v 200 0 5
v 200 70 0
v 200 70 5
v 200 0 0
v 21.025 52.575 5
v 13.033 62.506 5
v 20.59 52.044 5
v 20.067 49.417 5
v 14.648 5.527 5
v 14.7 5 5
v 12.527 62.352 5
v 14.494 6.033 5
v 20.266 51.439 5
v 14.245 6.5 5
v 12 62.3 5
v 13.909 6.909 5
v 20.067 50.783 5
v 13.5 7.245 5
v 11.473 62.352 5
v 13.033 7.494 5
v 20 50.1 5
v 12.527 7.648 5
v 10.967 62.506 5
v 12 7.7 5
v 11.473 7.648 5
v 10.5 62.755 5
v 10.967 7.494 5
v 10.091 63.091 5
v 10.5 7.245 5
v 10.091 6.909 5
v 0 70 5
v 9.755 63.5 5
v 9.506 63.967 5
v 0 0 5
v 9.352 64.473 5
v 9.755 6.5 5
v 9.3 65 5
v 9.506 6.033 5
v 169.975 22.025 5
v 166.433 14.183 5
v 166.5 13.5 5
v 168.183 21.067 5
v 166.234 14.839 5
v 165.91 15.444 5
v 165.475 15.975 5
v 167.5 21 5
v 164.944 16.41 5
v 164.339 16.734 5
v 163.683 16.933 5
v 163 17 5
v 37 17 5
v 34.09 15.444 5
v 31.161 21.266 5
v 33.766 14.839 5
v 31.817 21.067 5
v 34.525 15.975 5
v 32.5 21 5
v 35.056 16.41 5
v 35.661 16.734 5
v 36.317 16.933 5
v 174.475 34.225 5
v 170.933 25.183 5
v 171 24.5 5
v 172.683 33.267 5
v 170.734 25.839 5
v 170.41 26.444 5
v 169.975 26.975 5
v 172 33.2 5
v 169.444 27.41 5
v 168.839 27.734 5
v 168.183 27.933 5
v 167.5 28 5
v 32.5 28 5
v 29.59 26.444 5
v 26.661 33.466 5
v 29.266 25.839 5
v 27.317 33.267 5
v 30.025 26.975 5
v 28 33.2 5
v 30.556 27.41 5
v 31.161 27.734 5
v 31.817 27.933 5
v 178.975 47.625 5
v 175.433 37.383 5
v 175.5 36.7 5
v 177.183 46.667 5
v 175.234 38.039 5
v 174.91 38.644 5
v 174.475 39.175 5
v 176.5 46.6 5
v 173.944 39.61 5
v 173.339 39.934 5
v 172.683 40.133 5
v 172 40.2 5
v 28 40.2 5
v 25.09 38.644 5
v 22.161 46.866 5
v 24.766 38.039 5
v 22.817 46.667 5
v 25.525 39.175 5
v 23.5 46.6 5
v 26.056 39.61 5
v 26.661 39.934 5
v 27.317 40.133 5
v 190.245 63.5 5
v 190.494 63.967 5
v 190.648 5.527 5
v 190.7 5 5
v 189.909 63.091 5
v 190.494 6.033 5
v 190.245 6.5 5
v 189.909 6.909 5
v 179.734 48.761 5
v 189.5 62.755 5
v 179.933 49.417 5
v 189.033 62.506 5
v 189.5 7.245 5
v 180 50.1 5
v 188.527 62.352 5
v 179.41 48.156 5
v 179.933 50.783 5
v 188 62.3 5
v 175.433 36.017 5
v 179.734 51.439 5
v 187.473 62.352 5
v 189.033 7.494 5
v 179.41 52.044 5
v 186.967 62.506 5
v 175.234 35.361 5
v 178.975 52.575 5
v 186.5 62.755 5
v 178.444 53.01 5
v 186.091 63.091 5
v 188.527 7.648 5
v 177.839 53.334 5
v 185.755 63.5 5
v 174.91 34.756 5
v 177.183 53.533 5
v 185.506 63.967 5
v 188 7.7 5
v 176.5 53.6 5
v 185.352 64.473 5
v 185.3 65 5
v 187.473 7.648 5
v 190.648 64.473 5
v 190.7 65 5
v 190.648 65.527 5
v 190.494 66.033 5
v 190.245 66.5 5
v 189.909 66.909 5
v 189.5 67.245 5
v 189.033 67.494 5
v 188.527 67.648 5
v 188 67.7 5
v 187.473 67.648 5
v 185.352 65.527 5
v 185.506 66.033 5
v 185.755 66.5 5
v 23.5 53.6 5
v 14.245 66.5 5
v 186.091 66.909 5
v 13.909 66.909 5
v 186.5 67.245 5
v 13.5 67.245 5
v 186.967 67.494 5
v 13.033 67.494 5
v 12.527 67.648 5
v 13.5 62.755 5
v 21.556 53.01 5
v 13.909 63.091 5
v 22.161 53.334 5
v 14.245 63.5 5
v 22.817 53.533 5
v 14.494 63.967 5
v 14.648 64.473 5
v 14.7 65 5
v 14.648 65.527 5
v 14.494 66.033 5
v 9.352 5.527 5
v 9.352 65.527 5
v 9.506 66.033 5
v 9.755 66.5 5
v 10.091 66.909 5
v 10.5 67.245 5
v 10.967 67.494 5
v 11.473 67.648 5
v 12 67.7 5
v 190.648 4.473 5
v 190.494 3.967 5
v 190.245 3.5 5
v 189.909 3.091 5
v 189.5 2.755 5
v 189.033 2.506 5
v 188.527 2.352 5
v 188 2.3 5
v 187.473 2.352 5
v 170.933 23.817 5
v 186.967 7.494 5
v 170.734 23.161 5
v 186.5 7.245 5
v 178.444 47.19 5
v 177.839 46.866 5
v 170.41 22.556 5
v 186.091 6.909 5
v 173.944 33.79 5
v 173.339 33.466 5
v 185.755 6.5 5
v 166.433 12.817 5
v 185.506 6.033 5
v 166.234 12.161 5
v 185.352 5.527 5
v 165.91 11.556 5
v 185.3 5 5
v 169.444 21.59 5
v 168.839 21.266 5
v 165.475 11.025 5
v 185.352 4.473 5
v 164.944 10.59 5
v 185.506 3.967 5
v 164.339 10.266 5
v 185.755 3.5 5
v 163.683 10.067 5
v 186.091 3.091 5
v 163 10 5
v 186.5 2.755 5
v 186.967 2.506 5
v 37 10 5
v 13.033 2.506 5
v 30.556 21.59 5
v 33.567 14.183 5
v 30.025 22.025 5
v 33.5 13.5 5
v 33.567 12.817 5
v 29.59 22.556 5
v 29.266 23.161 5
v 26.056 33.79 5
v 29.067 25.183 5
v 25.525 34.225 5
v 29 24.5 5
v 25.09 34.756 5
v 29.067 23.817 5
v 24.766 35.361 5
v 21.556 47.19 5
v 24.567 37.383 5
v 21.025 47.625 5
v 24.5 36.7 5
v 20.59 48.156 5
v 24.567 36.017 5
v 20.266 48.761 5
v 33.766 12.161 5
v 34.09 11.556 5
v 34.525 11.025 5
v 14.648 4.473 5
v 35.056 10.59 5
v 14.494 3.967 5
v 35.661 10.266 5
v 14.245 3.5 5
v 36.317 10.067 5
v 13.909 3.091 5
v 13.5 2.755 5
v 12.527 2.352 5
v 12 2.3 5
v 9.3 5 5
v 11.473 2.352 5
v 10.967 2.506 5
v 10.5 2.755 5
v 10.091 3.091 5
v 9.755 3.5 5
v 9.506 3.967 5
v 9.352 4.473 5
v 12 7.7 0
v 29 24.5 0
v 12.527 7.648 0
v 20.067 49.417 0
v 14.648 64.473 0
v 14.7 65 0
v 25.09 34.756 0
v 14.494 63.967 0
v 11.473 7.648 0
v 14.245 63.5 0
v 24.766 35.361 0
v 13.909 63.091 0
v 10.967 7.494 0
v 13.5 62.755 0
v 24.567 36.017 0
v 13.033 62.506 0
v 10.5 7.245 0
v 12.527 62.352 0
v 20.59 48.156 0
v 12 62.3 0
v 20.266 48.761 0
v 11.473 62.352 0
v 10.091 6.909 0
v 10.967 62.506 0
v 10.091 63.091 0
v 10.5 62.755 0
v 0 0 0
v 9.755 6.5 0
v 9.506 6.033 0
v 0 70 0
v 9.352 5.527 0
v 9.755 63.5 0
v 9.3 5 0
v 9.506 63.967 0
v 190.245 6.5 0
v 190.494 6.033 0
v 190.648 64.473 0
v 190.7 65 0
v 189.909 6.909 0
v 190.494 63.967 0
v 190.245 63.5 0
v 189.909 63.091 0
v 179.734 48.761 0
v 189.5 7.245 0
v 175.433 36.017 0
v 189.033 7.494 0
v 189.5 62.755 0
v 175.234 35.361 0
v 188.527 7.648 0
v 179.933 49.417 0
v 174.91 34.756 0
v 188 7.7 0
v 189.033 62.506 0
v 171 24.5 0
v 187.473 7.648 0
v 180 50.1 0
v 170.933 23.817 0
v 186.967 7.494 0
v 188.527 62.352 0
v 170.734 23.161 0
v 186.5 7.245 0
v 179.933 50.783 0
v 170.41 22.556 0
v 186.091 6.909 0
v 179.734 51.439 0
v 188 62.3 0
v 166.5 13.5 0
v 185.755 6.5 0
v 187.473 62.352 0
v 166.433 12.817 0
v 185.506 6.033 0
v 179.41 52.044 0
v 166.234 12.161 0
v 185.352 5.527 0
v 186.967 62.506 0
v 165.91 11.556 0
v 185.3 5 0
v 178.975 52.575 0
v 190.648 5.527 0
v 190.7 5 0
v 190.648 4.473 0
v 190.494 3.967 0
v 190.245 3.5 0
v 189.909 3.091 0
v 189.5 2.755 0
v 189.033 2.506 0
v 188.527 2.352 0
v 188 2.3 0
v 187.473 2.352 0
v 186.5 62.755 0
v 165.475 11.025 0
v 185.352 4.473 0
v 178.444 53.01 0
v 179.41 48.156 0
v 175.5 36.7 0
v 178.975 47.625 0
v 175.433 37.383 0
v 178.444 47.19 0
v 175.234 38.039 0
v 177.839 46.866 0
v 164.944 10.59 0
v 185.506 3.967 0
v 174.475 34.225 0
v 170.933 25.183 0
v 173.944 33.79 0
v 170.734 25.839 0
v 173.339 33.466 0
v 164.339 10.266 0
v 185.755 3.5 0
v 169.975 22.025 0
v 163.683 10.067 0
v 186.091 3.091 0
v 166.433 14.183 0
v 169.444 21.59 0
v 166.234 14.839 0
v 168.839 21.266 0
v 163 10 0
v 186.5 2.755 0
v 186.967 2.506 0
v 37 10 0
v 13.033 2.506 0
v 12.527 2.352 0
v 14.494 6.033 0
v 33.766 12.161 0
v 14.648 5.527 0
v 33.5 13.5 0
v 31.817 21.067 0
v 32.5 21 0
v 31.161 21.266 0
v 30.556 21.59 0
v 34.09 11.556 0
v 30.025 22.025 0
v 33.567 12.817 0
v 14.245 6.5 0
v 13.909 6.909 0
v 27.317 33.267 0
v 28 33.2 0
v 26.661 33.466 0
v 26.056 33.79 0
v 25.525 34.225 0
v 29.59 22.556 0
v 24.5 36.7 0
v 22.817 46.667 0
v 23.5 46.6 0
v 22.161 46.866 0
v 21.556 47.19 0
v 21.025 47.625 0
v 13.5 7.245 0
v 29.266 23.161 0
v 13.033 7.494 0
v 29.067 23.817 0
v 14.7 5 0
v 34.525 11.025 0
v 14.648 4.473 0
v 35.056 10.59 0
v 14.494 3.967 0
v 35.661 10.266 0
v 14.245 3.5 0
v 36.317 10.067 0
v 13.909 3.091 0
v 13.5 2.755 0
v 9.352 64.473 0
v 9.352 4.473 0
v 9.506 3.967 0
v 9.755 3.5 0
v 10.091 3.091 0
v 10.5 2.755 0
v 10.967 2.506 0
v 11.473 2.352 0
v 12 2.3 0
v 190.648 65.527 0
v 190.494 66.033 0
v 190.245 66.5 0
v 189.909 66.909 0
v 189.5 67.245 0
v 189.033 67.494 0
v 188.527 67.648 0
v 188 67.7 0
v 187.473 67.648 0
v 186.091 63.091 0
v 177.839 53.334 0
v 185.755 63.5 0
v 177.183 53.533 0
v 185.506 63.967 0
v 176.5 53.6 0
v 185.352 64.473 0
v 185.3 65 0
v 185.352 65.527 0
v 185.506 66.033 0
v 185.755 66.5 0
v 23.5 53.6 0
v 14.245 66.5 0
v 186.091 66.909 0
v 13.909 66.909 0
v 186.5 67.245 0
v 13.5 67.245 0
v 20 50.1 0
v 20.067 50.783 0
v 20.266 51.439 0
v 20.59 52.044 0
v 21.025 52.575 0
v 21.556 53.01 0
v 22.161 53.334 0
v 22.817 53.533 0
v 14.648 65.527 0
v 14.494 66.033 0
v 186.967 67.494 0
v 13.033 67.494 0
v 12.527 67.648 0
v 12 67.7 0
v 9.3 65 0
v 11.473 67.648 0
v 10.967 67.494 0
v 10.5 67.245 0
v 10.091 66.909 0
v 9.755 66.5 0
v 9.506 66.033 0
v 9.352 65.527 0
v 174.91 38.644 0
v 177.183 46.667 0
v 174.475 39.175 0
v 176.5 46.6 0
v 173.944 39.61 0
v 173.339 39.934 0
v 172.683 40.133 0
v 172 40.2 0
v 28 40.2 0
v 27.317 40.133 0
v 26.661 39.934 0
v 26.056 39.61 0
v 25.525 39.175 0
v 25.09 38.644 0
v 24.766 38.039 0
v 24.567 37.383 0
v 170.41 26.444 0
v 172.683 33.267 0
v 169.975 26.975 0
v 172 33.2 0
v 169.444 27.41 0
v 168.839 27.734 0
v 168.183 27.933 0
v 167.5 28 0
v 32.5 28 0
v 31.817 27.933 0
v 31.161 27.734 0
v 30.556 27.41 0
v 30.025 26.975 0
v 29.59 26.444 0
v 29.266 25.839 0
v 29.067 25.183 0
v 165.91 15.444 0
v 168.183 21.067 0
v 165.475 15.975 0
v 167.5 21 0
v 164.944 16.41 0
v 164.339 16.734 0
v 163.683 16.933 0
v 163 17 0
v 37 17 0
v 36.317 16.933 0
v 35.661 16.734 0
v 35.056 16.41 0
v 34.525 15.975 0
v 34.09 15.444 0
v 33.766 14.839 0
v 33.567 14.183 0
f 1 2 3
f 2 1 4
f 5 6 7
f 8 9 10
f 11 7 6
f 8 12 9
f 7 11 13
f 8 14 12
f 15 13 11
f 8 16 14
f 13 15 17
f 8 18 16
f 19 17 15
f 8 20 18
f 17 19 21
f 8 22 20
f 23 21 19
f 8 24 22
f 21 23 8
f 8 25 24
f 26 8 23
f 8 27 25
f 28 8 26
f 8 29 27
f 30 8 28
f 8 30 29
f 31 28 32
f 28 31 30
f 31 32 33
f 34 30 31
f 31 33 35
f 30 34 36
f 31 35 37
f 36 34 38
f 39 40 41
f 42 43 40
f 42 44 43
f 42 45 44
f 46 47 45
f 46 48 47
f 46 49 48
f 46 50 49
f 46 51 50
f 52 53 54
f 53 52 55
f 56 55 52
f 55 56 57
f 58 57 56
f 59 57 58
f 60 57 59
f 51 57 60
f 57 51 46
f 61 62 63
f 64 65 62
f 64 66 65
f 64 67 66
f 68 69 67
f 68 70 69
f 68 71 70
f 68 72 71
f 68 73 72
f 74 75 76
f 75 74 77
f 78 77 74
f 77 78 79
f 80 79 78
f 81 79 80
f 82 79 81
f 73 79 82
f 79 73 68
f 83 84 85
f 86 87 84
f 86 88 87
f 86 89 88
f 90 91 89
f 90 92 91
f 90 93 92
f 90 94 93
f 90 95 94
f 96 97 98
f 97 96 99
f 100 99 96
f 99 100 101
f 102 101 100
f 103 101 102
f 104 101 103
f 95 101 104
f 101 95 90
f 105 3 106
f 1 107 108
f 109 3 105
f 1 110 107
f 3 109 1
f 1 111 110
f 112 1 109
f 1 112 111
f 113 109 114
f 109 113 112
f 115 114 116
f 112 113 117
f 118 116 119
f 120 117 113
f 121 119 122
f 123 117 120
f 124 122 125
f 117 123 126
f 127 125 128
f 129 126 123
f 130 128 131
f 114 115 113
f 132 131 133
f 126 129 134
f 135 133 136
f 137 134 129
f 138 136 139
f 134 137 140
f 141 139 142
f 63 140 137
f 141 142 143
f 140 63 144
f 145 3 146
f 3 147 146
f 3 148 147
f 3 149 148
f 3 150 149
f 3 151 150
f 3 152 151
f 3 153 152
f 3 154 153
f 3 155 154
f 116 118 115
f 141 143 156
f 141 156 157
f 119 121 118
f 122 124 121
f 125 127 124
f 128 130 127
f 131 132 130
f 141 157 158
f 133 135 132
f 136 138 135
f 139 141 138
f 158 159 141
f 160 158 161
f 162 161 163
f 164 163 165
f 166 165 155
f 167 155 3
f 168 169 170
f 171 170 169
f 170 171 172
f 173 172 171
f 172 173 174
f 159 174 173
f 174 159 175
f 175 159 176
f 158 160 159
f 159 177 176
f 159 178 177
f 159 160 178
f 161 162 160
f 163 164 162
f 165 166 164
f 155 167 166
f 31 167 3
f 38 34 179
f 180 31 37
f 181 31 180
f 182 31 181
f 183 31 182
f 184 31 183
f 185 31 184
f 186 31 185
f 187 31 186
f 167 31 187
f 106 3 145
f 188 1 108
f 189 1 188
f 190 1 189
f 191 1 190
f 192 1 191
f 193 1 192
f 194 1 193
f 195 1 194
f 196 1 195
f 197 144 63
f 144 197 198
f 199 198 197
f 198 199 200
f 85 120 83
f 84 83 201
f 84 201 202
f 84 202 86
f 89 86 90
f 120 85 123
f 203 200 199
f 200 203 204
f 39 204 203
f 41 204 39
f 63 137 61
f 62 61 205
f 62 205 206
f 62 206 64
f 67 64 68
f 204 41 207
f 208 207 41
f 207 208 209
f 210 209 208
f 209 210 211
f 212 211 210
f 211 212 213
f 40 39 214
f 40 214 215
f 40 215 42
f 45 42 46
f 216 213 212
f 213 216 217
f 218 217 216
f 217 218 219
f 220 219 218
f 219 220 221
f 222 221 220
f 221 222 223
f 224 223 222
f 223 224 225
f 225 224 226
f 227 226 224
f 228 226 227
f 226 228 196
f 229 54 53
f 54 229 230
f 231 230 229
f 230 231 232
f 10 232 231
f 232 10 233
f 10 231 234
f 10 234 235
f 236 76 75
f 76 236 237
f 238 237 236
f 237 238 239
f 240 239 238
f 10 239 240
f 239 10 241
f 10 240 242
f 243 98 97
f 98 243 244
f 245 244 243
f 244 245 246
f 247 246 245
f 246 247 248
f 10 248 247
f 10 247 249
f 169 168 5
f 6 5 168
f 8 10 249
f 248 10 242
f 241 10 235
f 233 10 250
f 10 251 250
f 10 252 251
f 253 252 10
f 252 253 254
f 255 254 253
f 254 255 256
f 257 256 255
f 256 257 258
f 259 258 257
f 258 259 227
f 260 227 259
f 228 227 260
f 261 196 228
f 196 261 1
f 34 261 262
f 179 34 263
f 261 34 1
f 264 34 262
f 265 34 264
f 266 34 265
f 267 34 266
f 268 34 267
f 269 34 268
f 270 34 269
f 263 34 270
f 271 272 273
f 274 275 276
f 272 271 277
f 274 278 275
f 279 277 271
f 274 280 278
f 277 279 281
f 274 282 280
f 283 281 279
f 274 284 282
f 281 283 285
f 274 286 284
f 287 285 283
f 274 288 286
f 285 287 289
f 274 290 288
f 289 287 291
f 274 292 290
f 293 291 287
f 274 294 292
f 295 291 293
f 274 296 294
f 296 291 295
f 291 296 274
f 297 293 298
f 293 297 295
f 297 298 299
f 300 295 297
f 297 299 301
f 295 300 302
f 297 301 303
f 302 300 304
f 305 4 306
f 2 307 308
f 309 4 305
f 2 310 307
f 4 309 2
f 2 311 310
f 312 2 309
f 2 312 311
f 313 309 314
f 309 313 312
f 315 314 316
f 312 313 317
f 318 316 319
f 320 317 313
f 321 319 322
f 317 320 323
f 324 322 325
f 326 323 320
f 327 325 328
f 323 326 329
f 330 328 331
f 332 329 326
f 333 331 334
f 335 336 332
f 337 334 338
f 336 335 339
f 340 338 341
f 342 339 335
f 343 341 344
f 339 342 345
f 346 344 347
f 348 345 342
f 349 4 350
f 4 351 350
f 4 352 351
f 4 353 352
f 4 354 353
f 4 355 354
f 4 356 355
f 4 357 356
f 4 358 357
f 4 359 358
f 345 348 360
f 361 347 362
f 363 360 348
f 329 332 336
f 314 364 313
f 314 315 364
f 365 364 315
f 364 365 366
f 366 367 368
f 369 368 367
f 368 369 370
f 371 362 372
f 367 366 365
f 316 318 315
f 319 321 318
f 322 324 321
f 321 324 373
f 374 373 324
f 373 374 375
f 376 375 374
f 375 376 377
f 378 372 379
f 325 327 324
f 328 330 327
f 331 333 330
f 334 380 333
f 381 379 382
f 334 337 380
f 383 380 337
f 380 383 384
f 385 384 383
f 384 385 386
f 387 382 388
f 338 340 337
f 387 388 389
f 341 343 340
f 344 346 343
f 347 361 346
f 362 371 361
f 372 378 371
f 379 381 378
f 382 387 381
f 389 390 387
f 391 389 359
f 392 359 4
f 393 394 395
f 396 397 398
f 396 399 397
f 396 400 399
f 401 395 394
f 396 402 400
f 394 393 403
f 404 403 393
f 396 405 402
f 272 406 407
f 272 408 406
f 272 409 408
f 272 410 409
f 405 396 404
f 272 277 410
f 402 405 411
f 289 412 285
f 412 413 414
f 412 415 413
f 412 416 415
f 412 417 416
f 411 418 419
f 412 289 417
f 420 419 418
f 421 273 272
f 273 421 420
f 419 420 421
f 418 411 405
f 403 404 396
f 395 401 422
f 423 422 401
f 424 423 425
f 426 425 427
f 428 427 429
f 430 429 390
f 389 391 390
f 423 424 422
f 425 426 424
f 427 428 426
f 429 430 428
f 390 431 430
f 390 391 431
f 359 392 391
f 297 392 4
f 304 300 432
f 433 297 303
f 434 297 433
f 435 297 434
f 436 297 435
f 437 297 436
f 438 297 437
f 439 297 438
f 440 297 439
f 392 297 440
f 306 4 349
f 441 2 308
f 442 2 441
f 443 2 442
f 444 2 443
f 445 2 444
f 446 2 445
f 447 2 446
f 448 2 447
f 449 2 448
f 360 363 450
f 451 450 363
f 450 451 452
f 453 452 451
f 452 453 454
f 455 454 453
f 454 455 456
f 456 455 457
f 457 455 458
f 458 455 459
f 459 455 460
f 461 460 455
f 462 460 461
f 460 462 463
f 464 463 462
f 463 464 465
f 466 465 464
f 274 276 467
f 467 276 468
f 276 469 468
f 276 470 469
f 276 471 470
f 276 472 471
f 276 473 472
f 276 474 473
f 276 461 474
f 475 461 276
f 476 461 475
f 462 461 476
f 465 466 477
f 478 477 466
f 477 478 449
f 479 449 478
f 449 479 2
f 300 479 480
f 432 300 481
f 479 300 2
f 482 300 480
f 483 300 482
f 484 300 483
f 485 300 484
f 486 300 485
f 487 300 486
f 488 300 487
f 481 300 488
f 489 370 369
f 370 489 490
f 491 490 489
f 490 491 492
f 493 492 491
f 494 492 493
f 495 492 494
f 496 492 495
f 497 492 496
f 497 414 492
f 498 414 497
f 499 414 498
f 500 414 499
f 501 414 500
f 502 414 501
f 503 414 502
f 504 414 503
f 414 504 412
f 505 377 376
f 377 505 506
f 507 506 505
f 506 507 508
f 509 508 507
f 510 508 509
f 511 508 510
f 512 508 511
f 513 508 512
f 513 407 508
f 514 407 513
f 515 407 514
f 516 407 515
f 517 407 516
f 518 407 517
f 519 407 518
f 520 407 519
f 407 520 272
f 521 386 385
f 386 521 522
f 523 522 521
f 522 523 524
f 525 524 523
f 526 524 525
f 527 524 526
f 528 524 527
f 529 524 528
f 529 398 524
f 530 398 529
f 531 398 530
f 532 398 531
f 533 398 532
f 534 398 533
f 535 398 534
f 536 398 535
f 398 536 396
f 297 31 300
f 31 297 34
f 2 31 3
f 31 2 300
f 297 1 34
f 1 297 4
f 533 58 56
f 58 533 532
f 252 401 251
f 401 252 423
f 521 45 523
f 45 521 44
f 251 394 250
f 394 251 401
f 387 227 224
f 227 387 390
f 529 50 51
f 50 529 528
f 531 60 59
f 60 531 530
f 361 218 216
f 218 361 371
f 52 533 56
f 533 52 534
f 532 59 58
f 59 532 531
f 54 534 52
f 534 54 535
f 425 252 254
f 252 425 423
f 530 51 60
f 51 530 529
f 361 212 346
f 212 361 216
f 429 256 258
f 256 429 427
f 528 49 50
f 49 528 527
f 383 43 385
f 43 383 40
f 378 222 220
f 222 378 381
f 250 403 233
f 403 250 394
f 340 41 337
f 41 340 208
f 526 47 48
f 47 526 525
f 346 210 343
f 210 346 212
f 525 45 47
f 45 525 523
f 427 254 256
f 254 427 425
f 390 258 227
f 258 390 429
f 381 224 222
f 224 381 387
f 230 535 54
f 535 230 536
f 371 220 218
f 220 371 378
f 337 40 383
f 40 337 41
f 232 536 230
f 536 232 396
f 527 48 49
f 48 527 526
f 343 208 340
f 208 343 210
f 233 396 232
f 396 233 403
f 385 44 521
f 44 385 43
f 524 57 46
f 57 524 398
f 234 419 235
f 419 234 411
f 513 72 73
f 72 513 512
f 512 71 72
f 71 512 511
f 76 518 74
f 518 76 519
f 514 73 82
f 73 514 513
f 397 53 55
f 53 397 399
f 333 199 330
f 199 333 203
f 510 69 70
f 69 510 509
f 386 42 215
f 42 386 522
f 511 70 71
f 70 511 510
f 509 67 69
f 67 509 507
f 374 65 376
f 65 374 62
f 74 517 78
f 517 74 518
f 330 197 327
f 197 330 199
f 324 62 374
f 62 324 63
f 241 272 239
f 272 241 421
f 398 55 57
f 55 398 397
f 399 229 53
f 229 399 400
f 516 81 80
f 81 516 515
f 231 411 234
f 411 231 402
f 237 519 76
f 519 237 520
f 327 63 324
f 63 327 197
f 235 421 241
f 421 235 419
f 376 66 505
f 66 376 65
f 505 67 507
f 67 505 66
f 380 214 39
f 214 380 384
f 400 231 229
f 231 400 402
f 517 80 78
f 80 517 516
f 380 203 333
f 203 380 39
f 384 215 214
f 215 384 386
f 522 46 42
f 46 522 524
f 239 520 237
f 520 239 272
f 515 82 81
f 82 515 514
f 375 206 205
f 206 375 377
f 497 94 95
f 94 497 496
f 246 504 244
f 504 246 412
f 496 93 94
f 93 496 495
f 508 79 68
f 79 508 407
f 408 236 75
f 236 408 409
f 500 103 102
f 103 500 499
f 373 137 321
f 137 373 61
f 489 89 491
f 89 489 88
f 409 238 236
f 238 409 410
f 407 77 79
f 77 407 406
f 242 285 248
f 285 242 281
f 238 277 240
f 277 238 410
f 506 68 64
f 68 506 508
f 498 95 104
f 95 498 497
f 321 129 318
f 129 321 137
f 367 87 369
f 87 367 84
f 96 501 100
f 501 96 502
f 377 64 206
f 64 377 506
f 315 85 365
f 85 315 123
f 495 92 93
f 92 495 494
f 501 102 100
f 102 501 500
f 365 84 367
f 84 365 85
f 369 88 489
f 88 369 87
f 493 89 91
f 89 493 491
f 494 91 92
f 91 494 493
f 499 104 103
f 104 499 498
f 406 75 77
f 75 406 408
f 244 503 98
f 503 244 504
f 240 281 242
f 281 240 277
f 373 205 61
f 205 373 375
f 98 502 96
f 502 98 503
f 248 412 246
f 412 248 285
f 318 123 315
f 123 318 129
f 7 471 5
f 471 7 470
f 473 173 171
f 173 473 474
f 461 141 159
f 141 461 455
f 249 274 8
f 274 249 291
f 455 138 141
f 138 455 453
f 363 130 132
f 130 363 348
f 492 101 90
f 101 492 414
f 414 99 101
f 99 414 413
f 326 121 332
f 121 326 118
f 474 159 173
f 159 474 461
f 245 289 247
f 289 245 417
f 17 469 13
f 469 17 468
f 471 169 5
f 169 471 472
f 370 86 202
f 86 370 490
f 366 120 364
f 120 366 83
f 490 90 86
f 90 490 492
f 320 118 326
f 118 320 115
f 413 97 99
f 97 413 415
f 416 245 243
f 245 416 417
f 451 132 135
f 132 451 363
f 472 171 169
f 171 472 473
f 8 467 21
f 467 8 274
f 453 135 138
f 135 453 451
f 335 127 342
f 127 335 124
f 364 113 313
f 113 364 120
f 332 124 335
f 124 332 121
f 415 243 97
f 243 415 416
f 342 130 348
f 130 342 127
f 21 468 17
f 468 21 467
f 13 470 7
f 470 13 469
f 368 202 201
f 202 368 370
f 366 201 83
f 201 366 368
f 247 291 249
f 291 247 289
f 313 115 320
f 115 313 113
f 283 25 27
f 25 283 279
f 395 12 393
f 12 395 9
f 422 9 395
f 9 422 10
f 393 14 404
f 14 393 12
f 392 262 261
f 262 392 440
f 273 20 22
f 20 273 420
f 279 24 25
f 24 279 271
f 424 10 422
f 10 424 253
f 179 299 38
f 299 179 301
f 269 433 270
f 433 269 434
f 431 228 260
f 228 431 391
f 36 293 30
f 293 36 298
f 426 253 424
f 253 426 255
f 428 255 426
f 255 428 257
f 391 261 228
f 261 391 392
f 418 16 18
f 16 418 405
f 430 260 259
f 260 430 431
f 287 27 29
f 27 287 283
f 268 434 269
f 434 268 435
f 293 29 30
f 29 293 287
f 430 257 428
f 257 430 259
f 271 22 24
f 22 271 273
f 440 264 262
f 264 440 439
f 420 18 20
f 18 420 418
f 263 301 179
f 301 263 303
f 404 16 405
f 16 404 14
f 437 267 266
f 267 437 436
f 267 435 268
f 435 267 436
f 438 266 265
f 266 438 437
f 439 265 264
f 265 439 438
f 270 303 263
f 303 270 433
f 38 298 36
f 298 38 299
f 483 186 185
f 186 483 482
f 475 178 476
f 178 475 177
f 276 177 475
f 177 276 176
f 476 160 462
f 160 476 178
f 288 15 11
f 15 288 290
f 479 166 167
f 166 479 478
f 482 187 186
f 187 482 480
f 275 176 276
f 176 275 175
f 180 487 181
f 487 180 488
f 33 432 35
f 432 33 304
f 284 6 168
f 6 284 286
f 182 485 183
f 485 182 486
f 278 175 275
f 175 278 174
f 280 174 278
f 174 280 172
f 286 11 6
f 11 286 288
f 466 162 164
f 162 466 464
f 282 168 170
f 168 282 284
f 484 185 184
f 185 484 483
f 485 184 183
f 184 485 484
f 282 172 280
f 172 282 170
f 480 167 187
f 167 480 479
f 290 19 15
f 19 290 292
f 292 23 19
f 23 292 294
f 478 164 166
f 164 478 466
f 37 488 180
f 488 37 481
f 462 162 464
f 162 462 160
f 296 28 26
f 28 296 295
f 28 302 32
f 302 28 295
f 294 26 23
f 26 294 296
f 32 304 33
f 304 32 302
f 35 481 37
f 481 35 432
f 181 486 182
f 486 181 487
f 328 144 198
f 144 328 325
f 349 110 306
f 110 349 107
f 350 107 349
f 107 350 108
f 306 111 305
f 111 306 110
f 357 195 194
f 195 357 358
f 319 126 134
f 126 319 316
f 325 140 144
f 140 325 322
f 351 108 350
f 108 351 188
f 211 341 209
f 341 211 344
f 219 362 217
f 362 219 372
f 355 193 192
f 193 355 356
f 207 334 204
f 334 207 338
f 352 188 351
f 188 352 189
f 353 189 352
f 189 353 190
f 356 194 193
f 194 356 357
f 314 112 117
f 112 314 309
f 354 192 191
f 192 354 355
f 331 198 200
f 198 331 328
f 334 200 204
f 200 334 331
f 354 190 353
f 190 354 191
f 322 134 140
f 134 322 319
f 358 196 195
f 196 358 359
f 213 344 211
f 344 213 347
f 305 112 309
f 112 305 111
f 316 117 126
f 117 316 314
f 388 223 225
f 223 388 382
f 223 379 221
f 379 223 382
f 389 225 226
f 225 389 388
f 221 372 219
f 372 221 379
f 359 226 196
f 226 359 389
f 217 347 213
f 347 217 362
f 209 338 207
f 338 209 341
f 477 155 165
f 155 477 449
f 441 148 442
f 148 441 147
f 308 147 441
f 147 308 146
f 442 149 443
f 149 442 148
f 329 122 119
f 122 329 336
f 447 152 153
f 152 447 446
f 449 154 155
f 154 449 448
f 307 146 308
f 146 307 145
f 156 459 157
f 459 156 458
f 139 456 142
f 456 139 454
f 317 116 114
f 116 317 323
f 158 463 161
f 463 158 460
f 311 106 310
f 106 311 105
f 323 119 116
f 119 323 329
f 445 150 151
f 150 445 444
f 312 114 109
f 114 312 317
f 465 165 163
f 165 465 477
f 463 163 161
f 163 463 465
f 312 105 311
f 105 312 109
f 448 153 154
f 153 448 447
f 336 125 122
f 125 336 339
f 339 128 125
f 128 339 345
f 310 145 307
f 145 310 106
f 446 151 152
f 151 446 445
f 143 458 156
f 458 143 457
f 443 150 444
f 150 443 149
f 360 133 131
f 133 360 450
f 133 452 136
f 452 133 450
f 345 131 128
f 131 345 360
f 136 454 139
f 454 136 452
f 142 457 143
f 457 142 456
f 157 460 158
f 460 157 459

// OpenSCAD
$fn = 32;

// ----------------------------------------------------------------------
// Slotted panel: 200 x 70 mm, 4 ряда of slots
// ----------------------------------------------------------------------

// --- parameters (mm) ---
panel_w = 200;            // panel width
panel_d = 70;             // panel depth
thick = 5;                // panel thickness
slot_w = 7;               // slot width
pitch0 = 11;              // first row pitch
pitch_step = 1.2;         // pitch increase per row
margin = 10;              // margin around the slot field
rows = 4;                 // number of slot rows
mount_d = 5.4;            // mounting holes
mount_x = 88;             // mounting hole offset

difference() {
  union() {
    cube([panel_w, panel_d, thick]);
  }
  /* slot rows: stadium shaped cutters, 2.5 mm clear of both faces */
  /* row 0: pitch 11, length 126 */
  hull() {
    translate([37, 13.5, -2.5]) cylinder(h = thick + 5, d = slot_w);
    translate([163, 13.5, -2.5]) cylinder(h = thick + 5, d = slot_w);
  }
  /* row 1: pitch 12.2, length 135 */
  hull() {
    translate([32.5, 24.5, -2.5]) cylinder(h = thick + 5, d = slot_w);
    translate([167.5, 24.5, -2.5]) cylinder(h = thick + 5, d = slot_w);
  }
  /* row 2: pitch 13.4, length 144 */
  hull() {
    translate([28, 36.7, -2.5]) cylinder(h = thick + 5, d = slot_w);
    translate([172, 36.7, -2.5]) cylinder(h = thick + 5, d = slot_w);
  }
  /* row 3: pitch 14.6, length 153 */
  hull() {
    translate([23.5, 50.1, -2.5]) cylinder(h = thick + 5, d = slot_w);
    translate([176.5, 50.1, -2.5]) cylinder(h = thick + 5, d = slot_w);
  }
  translate([12, 5, -2.5]) cylinder(h = 10, d = mount_d);
  translate([12, 65, -2.5]) cylinder(h = 10, d = mount_d);
  translate([188, 5, -2.5]) cylinder(h = 10, d = mount_d);
  translate([188, 65, -2.5]) cylinder(h = 10, d = mount_d);
}
